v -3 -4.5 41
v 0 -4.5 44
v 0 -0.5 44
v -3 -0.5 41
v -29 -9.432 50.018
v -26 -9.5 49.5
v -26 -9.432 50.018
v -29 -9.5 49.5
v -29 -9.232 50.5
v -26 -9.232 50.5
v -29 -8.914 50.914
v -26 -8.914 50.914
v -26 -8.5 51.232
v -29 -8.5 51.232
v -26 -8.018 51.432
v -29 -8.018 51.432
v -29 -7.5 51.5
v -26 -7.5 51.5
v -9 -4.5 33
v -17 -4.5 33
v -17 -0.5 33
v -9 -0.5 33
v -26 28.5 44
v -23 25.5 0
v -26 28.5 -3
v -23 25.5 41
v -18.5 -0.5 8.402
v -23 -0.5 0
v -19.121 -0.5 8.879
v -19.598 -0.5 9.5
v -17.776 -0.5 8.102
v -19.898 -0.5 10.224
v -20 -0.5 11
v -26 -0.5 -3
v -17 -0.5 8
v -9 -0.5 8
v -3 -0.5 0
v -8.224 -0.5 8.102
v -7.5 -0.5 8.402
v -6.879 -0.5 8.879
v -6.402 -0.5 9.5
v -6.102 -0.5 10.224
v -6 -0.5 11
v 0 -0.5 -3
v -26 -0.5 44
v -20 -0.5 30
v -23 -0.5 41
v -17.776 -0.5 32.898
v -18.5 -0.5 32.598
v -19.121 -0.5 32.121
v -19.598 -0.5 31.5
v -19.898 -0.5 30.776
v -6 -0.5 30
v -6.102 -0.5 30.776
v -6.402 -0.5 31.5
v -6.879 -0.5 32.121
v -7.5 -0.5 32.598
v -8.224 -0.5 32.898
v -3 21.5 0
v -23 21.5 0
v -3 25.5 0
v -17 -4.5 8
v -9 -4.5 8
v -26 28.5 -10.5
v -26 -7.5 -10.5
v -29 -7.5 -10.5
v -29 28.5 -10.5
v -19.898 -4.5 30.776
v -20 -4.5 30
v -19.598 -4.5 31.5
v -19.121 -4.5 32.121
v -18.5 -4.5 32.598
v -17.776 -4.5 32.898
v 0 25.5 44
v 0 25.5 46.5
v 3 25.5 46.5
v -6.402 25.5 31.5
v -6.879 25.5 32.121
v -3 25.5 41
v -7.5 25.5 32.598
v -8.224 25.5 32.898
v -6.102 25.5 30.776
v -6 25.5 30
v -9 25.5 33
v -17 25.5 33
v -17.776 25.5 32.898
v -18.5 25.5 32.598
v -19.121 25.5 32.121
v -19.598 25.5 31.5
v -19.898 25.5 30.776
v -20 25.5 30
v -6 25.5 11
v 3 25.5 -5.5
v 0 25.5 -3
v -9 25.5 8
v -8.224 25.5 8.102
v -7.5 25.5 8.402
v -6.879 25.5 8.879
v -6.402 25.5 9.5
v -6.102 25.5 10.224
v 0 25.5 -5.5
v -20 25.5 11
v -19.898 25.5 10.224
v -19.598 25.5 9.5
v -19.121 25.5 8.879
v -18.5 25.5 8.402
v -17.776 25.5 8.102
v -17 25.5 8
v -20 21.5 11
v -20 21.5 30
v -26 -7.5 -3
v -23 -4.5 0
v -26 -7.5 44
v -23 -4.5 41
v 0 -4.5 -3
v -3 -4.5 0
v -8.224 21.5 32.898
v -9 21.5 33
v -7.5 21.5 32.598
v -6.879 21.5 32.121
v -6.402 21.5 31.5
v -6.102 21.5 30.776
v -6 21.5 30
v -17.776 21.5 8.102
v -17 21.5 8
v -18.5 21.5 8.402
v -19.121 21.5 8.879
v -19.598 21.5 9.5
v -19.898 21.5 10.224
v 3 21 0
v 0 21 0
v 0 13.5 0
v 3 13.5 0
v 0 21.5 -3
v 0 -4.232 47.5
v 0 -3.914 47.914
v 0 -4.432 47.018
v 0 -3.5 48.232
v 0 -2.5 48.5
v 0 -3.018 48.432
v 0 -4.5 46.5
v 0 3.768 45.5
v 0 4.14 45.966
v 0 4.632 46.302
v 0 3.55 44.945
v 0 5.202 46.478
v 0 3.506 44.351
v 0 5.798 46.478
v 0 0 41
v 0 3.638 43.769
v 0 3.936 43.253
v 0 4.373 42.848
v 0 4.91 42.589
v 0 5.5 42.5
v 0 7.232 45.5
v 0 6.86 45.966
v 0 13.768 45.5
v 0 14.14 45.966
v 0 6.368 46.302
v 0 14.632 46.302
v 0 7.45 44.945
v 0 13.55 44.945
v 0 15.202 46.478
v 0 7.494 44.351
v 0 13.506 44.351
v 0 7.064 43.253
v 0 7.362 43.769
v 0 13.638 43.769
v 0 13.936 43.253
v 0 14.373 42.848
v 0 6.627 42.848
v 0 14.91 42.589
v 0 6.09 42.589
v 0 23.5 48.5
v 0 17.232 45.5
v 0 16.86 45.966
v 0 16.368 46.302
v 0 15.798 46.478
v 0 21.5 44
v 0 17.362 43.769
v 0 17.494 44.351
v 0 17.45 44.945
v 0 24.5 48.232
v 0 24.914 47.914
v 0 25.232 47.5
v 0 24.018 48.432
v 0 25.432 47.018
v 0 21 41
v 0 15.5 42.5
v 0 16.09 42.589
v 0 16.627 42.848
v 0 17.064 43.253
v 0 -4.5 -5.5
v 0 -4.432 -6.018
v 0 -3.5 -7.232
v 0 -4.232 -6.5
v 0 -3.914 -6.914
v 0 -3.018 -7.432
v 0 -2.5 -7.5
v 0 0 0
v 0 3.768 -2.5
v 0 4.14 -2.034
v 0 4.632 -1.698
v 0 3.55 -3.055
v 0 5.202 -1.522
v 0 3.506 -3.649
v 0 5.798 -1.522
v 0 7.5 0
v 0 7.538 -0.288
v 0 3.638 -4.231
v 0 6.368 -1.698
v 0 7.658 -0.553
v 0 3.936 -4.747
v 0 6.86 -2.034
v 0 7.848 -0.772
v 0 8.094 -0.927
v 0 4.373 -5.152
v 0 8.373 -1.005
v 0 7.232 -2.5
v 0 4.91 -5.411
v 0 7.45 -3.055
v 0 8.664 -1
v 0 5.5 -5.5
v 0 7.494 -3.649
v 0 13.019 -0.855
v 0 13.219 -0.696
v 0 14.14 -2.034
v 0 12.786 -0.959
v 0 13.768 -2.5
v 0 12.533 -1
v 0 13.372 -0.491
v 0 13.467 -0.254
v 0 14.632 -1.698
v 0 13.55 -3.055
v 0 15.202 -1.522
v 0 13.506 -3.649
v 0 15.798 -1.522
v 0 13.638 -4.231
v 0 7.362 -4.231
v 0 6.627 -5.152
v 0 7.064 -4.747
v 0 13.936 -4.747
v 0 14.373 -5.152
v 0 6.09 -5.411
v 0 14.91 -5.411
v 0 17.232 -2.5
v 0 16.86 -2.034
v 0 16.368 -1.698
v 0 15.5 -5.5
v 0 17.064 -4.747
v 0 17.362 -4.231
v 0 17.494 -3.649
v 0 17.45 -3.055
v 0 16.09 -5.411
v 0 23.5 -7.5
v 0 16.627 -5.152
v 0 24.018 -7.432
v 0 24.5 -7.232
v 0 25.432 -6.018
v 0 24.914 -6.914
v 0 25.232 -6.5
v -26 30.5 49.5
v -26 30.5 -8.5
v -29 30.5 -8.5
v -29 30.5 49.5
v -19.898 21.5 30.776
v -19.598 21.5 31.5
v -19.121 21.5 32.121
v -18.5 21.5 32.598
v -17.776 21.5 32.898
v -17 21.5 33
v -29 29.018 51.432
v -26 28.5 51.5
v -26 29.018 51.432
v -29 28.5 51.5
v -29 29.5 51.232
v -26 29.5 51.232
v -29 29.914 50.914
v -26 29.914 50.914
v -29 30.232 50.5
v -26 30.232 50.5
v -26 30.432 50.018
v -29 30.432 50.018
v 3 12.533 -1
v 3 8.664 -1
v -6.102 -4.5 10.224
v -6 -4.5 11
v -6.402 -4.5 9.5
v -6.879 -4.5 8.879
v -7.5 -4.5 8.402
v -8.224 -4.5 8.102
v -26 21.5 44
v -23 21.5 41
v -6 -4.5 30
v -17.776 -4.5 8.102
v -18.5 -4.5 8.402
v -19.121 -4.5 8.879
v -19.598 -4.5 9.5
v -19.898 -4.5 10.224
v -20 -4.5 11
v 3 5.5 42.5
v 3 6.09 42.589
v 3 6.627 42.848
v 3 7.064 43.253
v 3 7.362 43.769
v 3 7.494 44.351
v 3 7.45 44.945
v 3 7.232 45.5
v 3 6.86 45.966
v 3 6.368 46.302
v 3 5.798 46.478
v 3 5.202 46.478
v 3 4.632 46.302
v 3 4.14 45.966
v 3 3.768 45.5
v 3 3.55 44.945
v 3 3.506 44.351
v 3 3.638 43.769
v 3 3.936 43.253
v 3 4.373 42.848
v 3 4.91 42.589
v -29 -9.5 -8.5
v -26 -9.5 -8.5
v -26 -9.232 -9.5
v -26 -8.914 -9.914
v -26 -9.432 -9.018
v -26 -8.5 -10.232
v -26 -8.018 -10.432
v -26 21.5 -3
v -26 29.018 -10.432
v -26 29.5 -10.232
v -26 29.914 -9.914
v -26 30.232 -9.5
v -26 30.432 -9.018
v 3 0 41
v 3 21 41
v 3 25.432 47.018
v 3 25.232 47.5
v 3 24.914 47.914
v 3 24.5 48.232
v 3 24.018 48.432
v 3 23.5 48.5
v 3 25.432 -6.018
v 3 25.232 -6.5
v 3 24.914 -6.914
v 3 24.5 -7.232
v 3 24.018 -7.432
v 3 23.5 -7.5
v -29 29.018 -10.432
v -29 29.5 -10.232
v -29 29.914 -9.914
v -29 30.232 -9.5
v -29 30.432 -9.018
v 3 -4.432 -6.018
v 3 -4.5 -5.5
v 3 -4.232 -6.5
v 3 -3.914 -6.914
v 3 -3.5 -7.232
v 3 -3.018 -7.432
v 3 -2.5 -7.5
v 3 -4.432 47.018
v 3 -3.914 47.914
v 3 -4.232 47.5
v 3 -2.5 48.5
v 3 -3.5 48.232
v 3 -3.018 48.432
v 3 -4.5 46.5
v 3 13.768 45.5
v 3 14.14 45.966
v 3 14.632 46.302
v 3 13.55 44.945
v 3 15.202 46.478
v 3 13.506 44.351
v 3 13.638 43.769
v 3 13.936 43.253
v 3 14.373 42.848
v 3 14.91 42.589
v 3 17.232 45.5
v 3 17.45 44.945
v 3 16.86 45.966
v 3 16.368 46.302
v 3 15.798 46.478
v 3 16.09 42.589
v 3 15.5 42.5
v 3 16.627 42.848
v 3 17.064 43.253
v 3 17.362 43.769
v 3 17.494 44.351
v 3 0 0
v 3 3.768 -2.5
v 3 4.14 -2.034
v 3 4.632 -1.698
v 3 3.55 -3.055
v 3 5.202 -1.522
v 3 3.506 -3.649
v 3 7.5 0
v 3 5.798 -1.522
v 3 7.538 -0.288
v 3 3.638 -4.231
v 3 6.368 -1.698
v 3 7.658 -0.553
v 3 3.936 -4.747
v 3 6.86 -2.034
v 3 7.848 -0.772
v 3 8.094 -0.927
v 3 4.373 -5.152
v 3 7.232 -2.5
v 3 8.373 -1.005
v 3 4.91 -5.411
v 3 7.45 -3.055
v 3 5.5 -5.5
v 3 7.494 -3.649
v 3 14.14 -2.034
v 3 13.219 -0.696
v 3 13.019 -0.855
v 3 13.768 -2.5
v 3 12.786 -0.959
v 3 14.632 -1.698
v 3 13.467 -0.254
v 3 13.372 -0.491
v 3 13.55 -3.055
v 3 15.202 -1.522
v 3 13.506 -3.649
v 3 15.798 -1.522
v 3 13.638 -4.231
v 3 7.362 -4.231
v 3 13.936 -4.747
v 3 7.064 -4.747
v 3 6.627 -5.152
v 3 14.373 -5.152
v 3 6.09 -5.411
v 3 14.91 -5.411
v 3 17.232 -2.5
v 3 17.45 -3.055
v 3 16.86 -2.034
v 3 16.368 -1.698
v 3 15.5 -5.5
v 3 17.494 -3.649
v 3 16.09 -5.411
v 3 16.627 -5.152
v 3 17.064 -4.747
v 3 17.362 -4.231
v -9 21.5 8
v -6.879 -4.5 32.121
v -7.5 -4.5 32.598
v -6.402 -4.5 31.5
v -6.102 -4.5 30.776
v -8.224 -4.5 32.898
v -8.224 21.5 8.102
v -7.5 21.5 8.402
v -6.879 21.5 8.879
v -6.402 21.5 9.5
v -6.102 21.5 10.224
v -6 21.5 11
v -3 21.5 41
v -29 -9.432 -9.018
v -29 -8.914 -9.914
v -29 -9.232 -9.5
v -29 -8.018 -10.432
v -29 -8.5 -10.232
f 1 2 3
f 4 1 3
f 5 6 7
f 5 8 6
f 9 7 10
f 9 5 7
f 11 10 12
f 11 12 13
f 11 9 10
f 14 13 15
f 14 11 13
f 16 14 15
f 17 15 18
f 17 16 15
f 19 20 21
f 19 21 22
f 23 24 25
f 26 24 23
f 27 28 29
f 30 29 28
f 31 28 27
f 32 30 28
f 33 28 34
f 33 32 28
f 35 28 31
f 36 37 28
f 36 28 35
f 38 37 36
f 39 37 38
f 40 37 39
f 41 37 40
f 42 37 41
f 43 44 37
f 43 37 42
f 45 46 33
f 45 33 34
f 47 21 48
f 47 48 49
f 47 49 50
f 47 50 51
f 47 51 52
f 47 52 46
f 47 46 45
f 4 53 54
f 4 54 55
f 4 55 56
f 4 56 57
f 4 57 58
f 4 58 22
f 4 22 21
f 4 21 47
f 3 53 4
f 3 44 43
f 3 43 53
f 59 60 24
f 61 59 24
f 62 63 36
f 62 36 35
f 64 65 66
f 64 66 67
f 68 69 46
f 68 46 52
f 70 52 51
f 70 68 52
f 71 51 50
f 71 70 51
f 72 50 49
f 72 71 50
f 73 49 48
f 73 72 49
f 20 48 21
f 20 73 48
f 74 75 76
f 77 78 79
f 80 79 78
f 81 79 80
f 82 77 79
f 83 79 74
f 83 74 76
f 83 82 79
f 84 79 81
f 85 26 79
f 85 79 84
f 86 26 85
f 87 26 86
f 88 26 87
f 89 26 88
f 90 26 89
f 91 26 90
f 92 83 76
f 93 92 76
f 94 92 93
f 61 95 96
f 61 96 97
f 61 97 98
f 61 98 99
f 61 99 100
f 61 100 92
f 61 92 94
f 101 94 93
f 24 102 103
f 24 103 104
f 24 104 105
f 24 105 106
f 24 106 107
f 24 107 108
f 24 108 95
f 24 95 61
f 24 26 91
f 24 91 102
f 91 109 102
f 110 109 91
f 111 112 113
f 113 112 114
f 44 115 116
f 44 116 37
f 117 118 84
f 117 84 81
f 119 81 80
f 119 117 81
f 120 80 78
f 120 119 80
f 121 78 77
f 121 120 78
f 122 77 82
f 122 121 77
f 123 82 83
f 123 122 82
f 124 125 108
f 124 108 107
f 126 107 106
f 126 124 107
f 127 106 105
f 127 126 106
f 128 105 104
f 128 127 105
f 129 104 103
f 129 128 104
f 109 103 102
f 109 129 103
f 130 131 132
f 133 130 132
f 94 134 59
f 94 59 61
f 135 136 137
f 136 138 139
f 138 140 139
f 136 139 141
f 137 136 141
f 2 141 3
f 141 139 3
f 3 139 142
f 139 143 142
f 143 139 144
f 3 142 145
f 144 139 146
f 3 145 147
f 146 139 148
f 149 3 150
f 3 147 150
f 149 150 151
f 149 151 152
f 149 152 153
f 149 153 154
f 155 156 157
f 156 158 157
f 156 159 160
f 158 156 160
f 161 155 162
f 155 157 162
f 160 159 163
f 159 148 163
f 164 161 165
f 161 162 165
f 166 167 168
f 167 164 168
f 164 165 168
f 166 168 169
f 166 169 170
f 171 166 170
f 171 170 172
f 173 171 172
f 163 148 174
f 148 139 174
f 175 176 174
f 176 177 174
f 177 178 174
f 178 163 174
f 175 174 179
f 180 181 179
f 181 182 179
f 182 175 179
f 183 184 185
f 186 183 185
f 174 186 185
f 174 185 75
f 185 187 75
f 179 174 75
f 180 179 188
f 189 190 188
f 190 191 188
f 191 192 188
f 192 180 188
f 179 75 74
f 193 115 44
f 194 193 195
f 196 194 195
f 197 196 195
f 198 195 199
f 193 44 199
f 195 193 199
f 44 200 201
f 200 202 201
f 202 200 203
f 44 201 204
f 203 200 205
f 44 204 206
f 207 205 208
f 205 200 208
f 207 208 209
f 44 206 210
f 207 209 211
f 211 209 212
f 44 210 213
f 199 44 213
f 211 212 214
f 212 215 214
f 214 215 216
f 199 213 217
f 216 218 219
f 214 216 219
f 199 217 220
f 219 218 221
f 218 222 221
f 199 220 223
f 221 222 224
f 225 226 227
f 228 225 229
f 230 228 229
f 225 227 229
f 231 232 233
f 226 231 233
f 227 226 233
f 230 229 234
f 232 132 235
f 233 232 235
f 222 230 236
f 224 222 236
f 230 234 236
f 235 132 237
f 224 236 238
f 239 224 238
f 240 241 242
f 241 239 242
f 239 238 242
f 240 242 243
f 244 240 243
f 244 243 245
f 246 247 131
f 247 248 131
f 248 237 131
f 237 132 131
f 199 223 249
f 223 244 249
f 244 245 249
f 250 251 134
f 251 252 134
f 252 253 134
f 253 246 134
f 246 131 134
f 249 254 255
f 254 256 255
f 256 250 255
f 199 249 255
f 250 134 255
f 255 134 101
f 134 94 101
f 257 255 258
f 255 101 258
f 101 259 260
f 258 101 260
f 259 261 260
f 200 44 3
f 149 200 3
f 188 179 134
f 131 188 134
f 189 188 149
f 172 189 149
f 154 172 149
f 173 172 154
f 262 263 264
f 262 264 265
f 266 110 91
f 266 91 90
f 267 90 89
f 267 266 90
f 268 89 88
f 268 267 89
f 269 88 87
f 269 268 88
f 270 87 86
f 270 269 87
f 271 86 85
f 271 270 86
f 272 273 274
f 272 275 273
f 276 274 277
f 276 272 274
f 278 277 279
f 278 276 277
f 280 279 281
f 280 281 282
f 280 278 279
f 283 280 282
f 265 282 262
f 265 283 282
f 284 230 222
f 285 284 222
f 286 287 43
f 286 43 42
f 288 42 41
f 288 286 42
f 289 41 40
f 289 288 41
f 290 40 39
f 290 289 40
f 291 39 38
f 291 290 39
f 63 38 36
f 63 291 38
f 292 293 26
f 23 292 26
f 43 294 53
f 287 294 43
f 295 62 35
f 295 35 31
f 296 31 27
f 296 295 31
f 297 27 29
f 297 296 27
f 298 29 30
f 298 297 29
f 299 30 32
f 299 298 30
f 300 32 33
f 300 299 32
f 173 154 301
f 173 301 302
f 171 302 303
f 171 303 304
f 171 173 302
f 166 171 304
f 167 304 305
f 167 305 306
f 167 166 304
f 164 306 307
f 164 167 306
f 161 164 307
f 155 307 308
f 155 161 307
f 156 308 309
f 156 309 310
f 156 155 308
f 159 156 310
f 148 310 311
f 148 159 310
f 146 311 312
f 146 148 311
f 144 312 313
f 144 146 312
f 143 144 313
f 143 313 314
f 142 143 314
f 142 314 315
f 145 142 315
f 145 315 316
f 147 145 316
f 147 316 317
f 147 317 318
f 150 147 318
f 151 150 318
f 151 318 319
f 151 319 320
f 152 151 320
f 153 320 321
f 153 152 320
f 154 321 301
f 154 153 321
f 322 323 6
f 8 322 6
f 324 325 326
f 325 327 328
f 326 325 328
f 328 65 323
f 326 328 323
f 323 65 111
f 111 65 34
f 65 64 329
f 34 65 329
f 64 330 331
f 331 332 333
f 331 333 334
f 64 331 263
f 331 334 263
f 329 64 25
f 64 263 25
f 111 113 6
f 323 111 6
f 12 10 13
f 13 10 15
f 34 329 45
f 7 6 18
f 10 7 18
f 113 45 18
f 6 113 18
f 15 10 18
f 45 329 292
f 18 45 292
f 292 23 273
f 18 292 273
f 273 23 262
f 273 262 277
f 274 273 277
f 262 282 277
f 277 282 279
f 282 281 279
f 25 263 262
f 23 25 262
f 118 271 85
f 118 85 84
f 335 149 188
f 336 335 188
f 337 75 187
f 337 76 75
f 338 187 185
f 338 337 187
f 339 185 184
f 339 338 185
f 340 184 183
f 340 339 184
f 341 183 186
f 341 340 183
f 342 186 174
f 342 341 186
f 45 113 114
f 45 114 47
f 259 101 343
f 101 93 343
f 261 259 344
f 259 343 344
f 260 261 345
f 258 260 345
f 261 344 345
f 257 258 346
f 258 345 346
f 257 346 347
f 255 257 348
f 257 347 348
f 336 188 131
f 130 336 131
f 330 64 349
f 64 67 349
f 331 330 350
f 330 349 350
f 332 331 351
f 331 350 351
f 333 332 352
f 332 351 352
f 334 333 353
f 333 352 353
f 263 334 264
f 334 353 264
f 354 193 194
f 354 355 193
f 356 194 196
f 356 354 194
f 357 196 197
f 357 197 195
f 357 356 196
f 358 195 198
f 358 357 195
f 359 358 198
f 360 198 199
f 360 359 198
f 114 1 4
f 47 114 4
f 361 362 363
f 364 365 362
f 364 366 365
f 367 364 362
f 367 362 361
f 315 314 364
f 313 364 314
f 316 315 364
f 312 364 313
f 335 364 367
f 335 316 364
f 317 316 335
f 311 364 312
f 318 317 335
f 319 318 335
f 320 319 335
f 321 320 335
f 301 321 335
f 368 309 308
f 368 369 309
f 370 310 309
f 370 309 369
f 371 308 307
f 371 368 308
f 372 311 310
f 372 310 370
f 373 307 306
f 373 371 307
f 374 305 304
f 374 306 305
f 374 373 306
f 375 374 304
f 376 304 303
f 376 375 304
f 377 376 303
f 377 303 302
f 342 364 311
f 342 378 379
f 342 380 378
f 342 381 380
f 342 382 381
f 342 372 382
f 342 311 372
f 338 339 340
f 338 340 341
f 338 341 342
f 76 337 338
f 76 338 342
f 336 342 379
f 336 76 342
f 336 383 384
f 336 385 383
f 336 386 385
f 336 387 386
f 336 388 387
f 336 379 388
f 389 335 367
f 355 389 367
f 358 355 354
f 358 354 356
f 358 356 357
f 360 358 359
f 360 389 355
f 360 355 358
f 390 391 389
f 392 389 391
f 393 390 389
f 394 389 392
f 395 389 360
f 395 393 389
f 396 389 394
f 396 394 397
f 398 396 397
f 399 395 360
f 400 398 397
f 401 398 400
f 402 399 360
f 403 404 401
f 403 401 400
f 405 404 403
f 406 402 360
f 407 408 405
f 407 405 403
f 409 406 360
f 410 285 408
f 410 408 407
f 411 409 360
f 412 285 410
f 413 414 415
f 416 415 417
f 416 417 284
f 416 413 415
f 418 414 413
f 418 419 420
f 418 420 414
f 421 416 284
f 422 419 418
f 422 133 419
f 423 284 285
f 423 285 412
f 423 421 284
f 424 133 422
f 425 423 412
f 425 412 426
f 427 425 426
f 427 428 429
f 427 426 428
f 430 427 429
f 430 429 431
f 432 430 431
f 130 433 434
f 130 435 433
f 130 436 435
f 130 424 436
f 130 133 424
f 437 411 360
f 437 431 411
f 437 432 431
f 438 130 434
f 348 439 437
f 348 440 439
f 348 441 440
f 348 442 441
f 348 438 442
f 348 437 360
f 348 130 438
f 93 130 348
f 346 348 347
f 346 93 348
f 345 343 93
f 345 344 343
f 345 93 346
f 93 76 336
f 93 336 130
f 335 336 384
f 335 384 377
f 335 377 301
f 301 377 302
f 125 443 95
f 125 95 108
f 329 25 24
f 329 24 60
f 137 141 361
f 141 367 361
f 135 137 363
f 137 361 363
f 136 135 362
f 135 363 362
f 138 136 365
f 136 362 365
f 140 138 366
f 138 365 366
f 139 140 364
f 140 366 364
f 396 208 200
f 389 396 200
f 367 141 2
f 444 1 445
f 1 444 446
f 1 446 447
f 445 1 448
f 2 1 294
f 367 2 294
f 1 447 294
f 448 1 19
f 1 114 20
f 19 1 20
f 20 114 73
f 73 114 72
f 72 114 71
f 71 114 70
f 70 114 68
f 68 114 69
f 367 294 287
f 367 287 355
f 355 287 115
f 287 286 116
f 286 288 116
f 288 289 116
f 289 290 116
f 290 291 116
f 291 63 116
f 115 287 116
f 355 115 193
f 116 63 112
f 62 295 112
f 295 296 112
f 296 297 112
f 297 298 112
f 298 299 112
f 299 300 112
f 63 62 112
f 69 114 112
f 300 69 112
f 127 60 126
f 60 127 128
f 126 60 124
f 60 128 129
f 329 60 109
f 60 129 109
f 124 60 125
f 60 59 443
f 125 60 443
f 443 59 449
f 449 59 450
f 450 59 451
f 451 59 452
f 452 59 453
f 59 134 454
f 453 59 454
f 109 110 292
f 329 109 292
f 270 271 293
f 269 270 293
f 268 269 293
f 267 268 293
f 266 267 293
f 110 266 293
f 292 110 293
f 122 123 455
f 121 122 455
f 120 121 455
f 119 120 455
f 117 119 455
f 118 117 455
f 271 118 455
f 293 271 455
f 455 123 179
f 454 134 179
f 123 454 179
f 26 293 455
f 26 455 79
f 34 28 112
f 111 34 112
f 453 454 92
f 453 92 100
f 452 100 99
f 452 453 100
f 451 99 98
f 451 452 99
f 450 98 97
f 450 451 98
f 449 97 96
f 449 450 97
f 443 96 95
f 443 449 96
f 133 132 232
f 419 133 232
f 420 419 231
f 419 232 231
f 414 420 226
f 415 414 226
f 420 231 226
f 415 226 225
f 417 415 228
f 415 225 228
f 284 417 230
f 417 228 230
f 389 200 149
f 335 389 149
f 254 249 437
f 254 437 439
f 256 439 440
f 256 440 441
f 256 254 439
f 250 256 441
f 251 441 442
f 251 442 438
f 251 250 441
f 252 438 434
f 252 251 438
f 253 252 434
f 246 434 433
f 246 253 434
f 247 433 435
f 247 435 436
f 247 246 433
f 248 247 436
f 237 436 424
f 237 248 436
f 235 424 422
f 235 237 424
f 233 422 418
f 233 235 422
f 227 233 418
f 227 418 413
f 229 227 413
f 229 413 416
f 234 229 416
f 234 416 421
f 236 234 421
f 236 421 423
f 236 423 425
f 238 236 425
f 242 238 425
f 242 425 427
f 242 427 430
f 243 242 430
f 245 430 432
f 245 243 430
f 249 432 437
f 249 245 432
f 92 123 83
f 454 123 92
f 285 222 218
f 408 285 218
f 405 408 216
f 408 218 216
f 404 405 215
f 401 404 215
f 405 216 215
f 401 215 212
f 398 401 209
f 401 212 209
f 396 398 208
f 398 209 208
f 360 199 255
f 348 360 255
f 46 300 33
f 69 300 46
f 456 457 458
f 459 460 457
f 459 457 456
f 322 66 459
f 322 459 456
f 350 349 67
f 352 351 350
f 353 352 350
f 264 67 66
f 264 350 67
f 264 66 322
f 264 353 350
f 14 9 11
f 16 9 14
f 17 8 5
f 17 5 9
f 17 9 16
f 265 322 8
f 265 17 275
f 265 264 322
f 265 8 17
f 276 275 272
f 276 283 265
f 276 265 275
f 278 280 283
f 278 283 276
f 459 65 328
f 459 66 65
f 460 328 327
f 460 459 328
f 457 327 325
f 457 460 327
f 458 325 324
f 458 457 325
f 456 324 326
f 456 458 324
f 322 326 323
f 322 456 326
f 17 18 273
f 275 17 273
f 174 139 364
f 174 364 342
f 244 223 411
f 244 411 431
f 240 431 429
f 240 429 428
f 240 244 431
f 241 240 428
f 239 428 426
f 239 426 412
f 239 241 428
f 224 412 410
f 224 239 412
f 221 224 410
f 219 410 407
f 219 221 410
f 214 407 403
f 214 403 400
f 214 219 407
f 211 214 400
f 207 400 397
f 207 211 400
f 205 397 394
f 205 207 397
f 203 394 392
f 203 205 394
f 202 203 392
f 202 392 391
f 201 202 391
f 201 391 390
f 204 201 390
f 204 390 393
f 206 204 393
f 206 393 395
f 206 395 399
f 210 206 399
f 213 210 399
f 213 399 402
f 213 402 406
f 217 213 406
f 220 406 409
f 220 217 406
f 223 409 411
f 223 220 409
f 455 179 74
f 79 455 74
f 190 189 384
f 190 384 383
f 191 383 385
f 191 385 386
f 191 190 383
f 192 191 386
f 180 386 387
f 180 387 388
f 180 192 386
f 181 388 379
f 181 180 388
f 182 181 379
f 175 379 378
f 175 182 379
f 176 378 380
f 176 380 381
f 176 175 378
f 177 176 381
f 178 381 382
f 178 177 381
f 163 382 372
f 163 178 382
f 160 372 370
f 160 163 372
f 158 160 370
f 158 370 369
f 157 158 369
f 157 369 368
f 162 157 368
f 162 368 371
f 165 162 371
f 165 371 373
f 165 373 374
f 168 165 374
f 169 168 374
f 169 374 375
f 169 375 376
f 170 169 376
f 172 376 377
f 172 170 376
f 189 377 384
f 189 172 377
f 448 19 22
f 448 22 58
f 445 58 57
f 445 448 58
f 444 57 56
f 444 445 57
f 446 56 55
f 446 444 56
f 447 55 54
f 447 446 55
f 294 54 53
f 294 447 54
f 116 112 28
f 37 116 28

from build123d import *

# Parameters (mm, degrees)
SKETCH_1_W          = 56
SKETCH_1_H          = 30
SKETCH_1_R          = 2
EXTRUDE_1_DEPTH     = 3
SKETCH_2_W          = 41
SKETCH_2_H          = 4
EXTRUDE_2_DEPTH     = 26
SKETCH_3_W          = 62
SKETCH_3_H          = 40
EXTRUDE_3_DEPTH     = 3
CHAMFER_2_SIZE      = 3
CUT_EXTRUDE_1_DEPTH = 36
FILLET_1_R          = 2
CHAMFER_3_SIZE      = 3
CHAMFER_4_SIZE      = 3


with BuildPart() as part:
    # Эскиз1 → Бобышка-Вытянуть1 (new body)
    with BuildSketch(Plane(origin=(0, 0, 0), x_dir=(0, 0, -1), z_dir=(1, 0, 0))):
        with Locations((-20.5, 10.5)):
            Rectangle(SKETCH_1_W, SKETCH_1_H)
        with Locations((3.5, 15.5)):
            Circle(SKETCH_1_R, mode=Mode.SUBTRACT)
        with Locations((3.5, 5.5)):
            Circle(SKETCH_1_R, mode=Mode.SUBTRACT)
        with Locations((-44.5, 5.5)):
            Circle(SKETCH_1_R, mode=Mode.SUBTRACT)
        with Locations((-44.5, 15.5)):
            Circle(SKETCH_1_R, mode=Mode.SUBTRACT)
        with BuildLine():
            Line((0, 0), (-41, 0))
            Line((-41, 0), (-41, 21))
            Line((-41, 21), (0, 21))
            Line((0, 21), (0, 13.499943953))
            ThreePointArc((0, 13.499943953), (0.695596702, 13.218912412), (1, 12.533221423))
            Line((1, 12.533221423), (1, 8.663676138))
            ThreePointArc((1, 8.663676138), (0.771906654, 7.848193044), (0, 7.500056047))
            Line((0, 7.500056047), (0, 0))
        make_face(mode=Mode.SUBTRACT)
    extrude(amount=EXTRUDE_1_DEPTH)

    # Эскиз2 → Бобышка-Вытянуть2 (add)
    with BuildSketch(Plane.ZY):
        with Locations((20.5, 23.5)):
            Rectangle(SKETCH_2_W, SKETCH_2_H)
        with Locations((20.5, -2.5)):
            Rectangle(SKETCH_2_W, SKETCH_2_H)
    extrude(amount=EXTRUDE_2_DEPTH)

    # Эскиз3 → Бобышка-Вытянуть3 (add)
    with BuildSketch(Plane.ZY.offset(26)):
        with Locations((20.5, 10.5)):
            Rectangle(SKETCH_3_W, SKETCH_3_H)
    extrude(amount=EXTRUDE_3_DEPTH)

    # Фаска2
    chamfer_2_edges = [part.edges().sort_by_distance(p)[0] for p in [
        (-26, 25.5, 20.5),
        (-26, -4.5, 20.5),
    ]]
    chamfer(chamfer_2_edges, length=CHAMFER_2_SIZE)

    # Эскиз4 → Вырез-Вытянуть1 (cut, through all)
    with BuildSketch(Plane.XZ.offset(4.5)):
        with BuildLine():
            Line((-17, 33), (-9, 33))
            ThreePointArc((-9, 33), (-6.878679656, 32.121320344), (-6, 30))
            Line((-6, 30), (-6, 11))
            ThreePointArc((-6, 11), (-6.878679656, 8.878679656), (-9, 8))
            Line((-9, 8), (-17, 8))
            ThreePointArc((-17, 8), (-19.121320344, 8.878679656), (-20, 11))
            Line((-20, 11), (-20, 30))
            ThreePointArc((-20, 30), (-19.121320344, 32.121320344), (-17, 33))
        make_face()
    extrude(amount=-CUT_EXTRUDE_1_DEPTH, mode=Mode.SUBTRACT)

    # Скругление1
    fillet_1_edges = [part.edges().sort_by_distance(p)[0] for p in [
        (1.5, -4.5, -7.5),
        (1.5, -4.5, 48.5),
        (1.5, 25.5, 48.5),
        (1.5, 25.5, -7.5),
        (-27.5, 30.5, -10.5),
        (-27.5, -9.5, -10.5),
        (-27.5, -9.5, 51.5),
        (-27.5, 30.5, 51.5),
    ]]
    fillet(fillet_1_edges, radius=FILLET_1_R)

    # Фаска3
    chamfer_3_edges = [part.edges().sort_by_distance(p)[0] for p in [
        (0, 23.5, 0),
        (0, 23.5, 41),
        (0, -2.5, 0),
        (0, -2.5, 41),
    ]]
    chamfer(chamfer_3_edges, length=CHAMFER_3_SIZE)

    # Фаска4
    chamfer_4_edges = [part.edges().sort_by_distance(p)[0] for p in [
        (-26, 25, 0),
        (-26, -4, 0),
        (-26, 25, 41),
        (-26, -4, 41),
    ]]
    chamfer(chamfer_4_edges, length=CHAMFER_4_SIZE)


solid = part.part
